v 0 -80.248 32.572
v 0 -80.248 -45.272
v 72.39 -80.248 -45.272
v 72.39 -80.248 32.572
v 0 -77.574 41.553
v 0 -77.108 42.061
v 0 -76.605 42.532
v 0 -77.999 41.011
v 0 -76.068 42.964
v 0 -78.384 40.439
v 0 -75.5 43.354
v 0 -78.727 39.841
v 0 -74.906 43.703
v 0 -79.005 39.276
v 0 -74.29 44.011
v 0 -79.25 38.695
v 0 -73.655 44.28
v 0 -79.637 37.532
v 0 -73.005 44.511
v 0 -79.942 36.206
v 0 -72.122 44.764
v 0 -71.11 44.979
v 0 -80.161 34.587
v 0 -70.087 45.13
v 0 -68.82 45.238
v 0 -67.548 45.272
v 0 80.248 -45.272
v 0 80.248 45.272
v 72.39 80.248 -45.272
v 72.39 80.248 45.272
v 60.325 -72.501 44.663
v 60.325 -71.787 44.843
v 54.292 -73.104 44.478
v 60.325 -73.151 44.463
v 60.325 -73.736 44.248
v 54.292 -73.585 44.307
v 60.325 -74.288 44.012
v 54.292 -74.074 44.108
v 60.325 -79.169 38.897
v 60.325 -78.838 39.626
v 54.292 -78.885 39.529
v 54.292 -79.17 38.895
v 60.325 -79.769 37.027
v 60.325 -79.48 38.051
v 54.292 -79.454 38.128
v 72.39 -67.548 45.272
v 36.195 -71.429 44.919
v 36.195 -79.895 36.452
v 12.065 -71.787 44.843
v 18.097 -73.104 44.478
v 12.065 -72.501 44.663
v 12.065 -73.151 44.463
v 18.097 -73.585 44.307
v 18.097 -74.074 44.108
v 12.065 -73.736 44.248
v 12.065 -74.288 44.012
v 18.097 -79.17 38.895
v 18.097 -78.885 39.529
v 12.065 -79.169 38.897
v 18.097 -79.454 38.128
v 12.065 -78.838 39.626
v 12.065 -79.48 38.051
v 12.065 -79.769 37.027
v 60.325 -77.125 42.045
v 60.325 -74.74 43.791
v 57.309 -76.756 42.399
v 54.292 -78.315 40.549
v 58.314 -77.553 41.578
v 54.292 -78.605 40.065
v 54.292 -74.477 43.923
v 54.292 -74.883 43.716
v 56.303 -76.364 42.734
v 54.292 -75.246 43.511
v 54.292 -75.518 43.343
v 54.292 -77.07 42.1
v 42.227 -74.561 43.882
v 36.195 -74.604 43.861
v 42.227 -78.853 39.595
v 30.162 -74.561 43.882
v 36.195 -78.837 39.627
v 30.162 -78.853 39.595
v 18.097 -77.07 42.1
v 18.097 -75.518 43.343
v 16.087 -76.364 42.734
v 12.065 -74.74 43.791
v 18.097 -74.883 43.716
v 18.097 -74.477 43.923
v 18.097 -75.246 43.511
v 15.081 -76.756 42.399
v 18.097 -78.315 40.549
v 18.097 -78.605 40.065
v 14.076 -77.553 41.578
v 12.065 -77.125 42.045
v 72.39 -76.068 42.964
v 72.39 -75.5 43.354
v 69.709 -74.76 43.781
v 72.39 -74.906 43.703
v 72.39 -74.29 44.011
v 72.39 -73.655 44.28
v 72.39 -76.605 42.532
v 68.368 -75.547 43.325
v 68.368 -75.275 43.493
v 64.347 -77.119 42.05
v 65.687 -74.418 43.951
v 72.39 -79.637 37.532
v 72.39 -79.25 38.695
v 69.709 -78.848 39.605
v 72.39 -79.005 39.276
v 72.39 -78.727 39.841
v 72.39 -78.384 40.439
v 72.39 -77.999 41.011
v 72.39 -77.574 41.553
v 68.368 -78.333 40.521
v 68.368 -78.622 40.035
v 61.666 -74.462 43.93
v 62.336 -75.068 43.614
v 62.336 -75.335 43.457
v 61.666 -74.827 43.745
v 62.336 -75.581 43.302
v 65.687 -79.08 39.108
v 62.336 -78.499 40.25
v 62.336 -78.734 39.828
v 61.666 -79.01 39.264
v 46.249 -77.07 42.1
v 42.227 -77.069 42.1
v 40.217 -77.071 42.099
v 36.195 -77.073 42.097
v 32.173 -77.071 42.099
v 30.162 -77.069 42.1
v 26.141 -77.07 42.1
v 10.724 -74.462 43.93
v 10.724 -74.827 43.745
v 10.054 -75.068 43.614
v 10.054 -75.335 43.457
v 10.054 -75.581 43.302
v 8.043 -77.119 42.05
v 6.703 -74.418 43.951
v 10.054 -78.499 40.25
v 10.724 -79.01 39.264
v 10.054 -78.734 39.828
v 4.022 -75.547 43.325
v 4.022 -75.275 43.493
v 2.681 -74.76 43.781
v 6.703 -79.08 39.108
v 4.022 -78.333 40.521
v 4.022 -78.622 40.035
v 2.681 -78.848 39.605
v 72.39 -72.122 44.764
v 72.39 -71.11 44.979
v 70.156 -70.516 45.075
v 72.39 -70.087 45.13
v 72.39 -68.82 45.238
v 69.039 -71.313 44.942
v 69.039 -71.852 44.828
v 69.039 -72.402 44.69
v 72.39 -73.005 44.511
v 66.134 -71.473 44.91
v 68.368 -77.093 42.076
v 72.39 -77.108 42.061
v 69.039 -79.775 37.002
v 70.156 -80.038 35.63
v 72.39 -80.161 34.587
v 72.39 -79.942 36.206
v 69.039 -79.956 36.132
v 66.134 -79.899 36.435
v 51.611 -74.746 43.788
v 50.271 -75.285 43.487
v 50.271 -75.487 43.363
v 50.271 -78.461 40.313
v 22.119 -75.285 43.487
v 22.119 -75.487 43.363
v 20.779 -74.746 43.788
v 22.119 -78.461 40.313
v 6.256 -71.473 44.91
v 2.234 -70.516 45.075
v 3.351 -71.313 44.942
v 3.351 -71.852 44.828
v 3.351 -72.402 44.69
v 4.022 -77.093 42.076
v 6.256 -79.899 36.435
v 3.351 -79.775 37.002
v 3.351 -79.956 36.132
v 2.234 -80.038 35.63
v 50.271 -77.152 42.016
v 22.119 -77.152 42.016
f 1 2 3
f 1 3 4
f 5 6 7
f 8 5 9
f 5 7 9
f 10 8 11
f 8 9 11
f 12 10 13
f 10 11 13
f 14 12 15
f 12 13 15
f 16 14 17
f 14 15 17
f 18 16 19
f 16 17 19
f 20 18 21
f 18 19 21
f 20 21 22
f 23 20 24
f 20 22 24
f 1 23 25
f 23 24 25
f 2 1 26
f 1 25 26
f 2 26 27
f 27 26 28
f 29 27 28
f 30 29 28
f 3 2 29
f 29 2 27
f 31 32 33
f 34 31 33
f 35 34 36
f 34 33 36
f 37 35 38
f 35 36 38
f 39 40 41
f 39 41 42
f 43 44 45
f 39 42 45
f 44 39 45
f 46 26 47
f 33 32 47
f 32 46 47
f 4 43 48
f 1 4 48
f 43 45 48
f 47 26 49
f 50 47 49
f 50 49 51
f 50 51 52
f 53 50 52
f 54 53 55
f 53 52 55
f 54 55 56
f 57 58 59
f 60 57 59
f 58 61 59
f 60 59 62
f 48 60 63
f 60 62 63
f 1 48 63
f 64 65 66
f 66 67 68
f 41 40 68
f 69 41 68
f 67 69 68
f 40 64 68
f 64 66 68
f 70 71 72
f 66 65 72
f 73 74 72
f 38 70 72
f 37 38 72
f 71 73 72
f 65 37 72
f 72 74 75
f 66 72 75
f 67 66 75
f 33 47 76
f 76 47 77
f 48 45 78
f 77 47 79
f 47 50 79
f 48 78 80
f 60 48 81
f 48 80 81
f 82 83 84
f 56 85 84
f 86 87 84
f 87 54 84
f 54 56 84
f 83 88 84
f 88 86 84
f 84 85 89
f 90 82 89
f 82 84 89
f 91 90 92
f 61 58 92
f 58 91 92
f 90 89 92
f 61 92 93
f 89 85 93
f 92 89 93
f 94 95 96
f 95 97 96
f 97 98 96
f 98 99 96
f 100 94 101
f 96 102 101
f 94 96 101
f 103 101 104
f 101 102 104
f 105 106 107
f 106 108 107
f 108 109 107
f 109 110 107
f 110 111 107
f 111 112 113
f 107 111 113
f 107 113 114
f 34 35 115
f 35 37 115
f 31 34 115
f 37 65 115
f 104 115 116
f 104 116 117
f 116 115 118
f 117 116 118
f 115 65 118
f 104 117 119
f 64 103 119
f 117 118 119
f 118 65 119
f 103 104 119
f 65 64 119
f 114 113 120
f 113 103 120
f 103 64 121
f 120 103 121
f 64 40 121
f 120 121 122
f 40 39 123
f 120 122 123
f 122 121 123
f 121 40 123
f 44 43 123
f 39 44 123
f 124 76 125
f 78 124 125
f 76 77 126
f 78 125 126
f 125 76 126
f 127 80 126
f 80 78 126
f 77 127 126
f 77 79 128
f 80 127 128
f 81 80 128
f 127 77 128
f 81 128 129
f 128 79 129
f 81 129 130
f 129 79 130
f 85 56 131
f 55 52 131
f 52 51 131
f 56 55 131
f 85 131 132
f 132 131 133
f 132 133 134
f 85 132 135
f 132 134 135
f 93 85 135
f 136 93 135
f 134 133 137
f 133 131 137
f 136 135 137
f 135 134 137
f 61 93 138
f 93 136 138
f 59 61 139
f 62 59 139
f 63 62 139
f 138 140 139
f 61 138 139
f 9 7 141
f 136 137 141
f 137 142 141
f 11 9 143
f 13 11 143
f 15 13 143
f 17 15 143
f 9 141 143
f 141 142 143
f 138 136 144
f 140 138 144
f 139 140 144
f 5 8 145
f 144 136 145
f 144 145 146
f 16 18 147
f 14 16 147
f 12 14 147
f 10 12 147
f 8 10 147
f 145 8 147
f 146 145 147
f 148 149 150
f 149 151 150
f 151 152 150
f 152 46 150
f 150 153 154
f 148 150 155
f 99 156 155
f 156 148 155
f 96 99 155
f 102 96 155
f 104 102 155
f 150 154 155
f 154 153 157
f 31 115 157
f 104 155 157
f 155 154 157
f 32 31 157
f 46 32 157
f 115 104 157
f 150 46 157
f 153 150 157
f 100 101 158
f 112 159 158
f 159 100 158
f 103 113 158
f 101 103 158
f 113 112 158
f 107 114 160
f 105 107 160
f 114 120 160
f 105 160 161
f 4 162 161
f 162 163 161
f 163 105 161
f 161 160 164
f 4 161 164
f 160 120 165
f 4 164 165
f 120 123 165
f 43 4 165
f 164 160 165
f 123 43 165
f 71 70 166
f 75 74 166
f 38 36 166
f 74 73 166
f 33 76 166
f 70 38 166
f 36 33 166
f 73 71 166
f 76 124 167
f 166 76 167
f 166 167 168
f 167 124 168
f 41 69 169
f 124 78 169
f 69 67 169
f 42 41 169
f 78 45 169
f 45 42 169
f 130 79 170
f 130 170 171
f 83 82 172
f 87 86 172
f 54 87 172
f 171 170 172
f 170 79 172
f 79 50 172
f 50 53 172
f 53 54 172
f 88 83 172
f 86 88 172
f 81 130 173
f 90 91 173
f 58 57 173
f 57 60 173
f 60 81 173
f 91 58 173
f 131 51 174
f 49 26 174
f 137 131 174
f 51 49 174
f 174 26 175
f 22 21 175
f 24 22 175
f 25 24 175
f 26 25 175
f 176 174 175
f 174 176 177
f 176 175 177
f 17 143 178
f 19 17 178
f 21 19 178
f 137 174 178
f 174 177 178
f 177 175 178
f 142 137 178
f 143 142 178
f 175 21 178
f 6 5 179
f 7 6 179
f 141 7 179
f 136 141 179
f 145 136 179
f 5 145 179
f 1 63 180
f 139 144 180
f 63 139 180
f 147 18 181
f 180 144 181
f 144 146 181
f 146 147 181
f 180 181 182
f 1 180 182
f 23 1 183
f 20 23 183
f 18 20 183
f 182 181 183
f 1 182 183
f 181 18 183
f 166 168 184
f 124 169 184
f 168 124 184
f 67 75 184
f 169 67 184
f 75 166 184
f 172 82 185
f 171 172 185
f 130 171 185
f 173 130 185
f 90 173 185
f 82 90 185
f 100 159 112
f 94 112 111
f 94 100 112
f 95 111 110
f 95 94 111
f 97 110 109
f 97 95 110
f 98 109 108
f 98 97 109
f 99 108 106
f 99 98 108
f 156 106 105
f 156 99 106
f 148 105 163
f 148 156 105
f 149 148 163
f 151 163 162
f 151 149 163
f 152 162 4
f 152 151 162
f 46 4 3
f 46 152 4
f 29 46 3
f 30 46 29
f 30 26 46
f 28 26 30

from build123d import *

# Parameters (mm, degrees)
F0_W        = 160.4959368706
F0_H        = 90.5437916517
F1_DEPTH    = 72.39
F2_T1_DEPTH = 135.89


# Not quite as in the source:
# - a fillet or chamfer that OpenCascade refuses, or shapes differently, is made with other operations: its cross-section is extruded or revolved along the edge and cut away or added


with BuildPart() as f1:
    # F0 (on Right) → F1 (new body)
    with BuildSketch(Plane.YZ):
        Rectangle(F0_W, F0_H)
    extrude(amount=F1_DEPTH)

    # F2: fillet of radius 12.7 on 1 edges, made by hand

    # F2_s2 → F2_t1 (cut)
    with BuildSketch(Plane.YZ.offset(-31.75)):
        with BuildLine():
            add(Edge.make_bspline(
                [(-67.5479684353, 45.2718958259), (-80.2479684353, 45.2718958259), (-80.2479684353, 32.5718958259)],
                knots=[0, 0, 0, 1, 1, 1], degree=2, weights=[1, 1, 1]))
            Line((-80.2479684353, 32.5718958259), (-80.2479684353, 45.2718958259))
            Line((-80.2479684353, 45.2718958259), (-67.5479684353, 45.2718958259))
        make_face()
    extrude(amount=F2_T1_DEPTH, mode=Mode.SUBTRACT)


solid = f1.part
